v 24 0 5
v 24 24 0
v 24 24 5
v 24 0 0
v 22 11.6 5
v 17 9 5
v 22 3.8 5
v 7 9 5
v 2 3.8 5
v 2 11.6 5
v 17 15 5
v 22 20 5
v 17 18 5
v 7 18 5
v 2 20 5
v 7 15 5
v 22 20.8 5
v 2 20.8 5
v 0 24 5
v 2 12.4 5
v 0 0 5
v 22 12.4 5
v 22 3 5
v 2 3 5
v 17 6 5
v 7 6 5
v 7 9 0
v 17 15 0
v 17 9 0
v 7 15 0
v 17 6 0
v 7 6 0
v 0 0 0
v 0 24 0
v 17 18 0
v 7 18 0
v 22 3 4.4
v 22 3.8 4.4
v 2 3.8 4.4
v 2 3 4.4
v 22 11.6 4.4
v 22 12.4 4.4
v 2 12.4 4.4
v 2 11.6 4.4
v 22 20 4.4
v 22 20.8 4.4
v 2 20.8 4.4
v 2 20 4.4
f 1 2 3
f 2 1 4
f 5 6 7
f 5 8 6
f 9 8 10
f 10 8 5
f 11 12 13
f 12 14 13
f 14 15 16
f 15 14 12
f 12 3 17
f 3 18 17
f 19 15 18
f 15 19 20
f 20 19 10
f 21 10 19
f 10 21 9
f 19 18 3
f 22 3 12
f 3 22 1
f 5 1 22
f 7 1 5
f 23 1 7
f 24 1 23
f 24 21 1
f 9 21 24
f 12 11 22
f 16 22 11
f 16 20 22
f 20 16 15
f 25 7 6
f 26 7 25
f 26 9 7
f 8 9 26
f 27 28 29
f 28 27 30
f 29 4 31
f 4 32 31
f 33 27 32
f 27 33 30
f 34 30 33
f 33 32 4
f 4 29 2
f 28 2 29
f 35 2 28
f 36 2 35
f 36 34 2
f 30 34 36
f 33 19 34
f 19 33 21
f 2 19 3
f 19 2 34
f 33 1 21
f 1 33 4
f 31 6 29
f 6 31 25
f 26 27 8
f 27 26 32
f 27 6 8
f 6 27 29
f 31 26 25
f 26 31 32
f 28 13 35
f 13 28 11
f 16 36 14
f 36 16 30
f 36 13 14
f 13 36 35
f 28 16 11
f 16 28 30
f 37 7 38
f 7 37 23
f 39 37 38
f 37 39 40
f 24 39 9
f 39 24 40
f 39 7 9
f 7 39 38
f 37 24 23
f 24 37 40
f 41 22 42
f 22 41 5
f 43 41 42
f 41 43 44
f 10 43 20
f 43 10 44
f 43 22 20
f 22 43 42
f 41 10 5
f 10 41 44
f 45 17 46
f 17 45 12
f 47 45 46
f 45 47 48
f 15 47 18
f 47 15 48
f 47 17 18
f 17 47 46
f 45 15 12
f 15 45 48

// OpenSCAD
// Original MechIntel educational model. CC0-1.0. Units: mm.
// Not a standardized or load-rated component.
$fn=96;
width=24;
length=24;
thickness=5;
groove_depth=0.6;
$fn=64;
difference(){union(){
translate([0,0,0]) cube([width,length,thickness]);
}
translate([7,6,-1]) cube([10,3,thickness+2]);
translate([7,15,-1]) cube([10,3,thickness+2]);
translate([2,3,thickness-groove_depth]) cube([width-4,0.8,groove_depth+1]);
translate([2,11.6,thickness-groove_depth]) cube([width-4,0.8,groove_depth+1]);
translate([2,20,thickness-groove_depth]) cube([width-4,0.8,groove_depth+1]);
}
